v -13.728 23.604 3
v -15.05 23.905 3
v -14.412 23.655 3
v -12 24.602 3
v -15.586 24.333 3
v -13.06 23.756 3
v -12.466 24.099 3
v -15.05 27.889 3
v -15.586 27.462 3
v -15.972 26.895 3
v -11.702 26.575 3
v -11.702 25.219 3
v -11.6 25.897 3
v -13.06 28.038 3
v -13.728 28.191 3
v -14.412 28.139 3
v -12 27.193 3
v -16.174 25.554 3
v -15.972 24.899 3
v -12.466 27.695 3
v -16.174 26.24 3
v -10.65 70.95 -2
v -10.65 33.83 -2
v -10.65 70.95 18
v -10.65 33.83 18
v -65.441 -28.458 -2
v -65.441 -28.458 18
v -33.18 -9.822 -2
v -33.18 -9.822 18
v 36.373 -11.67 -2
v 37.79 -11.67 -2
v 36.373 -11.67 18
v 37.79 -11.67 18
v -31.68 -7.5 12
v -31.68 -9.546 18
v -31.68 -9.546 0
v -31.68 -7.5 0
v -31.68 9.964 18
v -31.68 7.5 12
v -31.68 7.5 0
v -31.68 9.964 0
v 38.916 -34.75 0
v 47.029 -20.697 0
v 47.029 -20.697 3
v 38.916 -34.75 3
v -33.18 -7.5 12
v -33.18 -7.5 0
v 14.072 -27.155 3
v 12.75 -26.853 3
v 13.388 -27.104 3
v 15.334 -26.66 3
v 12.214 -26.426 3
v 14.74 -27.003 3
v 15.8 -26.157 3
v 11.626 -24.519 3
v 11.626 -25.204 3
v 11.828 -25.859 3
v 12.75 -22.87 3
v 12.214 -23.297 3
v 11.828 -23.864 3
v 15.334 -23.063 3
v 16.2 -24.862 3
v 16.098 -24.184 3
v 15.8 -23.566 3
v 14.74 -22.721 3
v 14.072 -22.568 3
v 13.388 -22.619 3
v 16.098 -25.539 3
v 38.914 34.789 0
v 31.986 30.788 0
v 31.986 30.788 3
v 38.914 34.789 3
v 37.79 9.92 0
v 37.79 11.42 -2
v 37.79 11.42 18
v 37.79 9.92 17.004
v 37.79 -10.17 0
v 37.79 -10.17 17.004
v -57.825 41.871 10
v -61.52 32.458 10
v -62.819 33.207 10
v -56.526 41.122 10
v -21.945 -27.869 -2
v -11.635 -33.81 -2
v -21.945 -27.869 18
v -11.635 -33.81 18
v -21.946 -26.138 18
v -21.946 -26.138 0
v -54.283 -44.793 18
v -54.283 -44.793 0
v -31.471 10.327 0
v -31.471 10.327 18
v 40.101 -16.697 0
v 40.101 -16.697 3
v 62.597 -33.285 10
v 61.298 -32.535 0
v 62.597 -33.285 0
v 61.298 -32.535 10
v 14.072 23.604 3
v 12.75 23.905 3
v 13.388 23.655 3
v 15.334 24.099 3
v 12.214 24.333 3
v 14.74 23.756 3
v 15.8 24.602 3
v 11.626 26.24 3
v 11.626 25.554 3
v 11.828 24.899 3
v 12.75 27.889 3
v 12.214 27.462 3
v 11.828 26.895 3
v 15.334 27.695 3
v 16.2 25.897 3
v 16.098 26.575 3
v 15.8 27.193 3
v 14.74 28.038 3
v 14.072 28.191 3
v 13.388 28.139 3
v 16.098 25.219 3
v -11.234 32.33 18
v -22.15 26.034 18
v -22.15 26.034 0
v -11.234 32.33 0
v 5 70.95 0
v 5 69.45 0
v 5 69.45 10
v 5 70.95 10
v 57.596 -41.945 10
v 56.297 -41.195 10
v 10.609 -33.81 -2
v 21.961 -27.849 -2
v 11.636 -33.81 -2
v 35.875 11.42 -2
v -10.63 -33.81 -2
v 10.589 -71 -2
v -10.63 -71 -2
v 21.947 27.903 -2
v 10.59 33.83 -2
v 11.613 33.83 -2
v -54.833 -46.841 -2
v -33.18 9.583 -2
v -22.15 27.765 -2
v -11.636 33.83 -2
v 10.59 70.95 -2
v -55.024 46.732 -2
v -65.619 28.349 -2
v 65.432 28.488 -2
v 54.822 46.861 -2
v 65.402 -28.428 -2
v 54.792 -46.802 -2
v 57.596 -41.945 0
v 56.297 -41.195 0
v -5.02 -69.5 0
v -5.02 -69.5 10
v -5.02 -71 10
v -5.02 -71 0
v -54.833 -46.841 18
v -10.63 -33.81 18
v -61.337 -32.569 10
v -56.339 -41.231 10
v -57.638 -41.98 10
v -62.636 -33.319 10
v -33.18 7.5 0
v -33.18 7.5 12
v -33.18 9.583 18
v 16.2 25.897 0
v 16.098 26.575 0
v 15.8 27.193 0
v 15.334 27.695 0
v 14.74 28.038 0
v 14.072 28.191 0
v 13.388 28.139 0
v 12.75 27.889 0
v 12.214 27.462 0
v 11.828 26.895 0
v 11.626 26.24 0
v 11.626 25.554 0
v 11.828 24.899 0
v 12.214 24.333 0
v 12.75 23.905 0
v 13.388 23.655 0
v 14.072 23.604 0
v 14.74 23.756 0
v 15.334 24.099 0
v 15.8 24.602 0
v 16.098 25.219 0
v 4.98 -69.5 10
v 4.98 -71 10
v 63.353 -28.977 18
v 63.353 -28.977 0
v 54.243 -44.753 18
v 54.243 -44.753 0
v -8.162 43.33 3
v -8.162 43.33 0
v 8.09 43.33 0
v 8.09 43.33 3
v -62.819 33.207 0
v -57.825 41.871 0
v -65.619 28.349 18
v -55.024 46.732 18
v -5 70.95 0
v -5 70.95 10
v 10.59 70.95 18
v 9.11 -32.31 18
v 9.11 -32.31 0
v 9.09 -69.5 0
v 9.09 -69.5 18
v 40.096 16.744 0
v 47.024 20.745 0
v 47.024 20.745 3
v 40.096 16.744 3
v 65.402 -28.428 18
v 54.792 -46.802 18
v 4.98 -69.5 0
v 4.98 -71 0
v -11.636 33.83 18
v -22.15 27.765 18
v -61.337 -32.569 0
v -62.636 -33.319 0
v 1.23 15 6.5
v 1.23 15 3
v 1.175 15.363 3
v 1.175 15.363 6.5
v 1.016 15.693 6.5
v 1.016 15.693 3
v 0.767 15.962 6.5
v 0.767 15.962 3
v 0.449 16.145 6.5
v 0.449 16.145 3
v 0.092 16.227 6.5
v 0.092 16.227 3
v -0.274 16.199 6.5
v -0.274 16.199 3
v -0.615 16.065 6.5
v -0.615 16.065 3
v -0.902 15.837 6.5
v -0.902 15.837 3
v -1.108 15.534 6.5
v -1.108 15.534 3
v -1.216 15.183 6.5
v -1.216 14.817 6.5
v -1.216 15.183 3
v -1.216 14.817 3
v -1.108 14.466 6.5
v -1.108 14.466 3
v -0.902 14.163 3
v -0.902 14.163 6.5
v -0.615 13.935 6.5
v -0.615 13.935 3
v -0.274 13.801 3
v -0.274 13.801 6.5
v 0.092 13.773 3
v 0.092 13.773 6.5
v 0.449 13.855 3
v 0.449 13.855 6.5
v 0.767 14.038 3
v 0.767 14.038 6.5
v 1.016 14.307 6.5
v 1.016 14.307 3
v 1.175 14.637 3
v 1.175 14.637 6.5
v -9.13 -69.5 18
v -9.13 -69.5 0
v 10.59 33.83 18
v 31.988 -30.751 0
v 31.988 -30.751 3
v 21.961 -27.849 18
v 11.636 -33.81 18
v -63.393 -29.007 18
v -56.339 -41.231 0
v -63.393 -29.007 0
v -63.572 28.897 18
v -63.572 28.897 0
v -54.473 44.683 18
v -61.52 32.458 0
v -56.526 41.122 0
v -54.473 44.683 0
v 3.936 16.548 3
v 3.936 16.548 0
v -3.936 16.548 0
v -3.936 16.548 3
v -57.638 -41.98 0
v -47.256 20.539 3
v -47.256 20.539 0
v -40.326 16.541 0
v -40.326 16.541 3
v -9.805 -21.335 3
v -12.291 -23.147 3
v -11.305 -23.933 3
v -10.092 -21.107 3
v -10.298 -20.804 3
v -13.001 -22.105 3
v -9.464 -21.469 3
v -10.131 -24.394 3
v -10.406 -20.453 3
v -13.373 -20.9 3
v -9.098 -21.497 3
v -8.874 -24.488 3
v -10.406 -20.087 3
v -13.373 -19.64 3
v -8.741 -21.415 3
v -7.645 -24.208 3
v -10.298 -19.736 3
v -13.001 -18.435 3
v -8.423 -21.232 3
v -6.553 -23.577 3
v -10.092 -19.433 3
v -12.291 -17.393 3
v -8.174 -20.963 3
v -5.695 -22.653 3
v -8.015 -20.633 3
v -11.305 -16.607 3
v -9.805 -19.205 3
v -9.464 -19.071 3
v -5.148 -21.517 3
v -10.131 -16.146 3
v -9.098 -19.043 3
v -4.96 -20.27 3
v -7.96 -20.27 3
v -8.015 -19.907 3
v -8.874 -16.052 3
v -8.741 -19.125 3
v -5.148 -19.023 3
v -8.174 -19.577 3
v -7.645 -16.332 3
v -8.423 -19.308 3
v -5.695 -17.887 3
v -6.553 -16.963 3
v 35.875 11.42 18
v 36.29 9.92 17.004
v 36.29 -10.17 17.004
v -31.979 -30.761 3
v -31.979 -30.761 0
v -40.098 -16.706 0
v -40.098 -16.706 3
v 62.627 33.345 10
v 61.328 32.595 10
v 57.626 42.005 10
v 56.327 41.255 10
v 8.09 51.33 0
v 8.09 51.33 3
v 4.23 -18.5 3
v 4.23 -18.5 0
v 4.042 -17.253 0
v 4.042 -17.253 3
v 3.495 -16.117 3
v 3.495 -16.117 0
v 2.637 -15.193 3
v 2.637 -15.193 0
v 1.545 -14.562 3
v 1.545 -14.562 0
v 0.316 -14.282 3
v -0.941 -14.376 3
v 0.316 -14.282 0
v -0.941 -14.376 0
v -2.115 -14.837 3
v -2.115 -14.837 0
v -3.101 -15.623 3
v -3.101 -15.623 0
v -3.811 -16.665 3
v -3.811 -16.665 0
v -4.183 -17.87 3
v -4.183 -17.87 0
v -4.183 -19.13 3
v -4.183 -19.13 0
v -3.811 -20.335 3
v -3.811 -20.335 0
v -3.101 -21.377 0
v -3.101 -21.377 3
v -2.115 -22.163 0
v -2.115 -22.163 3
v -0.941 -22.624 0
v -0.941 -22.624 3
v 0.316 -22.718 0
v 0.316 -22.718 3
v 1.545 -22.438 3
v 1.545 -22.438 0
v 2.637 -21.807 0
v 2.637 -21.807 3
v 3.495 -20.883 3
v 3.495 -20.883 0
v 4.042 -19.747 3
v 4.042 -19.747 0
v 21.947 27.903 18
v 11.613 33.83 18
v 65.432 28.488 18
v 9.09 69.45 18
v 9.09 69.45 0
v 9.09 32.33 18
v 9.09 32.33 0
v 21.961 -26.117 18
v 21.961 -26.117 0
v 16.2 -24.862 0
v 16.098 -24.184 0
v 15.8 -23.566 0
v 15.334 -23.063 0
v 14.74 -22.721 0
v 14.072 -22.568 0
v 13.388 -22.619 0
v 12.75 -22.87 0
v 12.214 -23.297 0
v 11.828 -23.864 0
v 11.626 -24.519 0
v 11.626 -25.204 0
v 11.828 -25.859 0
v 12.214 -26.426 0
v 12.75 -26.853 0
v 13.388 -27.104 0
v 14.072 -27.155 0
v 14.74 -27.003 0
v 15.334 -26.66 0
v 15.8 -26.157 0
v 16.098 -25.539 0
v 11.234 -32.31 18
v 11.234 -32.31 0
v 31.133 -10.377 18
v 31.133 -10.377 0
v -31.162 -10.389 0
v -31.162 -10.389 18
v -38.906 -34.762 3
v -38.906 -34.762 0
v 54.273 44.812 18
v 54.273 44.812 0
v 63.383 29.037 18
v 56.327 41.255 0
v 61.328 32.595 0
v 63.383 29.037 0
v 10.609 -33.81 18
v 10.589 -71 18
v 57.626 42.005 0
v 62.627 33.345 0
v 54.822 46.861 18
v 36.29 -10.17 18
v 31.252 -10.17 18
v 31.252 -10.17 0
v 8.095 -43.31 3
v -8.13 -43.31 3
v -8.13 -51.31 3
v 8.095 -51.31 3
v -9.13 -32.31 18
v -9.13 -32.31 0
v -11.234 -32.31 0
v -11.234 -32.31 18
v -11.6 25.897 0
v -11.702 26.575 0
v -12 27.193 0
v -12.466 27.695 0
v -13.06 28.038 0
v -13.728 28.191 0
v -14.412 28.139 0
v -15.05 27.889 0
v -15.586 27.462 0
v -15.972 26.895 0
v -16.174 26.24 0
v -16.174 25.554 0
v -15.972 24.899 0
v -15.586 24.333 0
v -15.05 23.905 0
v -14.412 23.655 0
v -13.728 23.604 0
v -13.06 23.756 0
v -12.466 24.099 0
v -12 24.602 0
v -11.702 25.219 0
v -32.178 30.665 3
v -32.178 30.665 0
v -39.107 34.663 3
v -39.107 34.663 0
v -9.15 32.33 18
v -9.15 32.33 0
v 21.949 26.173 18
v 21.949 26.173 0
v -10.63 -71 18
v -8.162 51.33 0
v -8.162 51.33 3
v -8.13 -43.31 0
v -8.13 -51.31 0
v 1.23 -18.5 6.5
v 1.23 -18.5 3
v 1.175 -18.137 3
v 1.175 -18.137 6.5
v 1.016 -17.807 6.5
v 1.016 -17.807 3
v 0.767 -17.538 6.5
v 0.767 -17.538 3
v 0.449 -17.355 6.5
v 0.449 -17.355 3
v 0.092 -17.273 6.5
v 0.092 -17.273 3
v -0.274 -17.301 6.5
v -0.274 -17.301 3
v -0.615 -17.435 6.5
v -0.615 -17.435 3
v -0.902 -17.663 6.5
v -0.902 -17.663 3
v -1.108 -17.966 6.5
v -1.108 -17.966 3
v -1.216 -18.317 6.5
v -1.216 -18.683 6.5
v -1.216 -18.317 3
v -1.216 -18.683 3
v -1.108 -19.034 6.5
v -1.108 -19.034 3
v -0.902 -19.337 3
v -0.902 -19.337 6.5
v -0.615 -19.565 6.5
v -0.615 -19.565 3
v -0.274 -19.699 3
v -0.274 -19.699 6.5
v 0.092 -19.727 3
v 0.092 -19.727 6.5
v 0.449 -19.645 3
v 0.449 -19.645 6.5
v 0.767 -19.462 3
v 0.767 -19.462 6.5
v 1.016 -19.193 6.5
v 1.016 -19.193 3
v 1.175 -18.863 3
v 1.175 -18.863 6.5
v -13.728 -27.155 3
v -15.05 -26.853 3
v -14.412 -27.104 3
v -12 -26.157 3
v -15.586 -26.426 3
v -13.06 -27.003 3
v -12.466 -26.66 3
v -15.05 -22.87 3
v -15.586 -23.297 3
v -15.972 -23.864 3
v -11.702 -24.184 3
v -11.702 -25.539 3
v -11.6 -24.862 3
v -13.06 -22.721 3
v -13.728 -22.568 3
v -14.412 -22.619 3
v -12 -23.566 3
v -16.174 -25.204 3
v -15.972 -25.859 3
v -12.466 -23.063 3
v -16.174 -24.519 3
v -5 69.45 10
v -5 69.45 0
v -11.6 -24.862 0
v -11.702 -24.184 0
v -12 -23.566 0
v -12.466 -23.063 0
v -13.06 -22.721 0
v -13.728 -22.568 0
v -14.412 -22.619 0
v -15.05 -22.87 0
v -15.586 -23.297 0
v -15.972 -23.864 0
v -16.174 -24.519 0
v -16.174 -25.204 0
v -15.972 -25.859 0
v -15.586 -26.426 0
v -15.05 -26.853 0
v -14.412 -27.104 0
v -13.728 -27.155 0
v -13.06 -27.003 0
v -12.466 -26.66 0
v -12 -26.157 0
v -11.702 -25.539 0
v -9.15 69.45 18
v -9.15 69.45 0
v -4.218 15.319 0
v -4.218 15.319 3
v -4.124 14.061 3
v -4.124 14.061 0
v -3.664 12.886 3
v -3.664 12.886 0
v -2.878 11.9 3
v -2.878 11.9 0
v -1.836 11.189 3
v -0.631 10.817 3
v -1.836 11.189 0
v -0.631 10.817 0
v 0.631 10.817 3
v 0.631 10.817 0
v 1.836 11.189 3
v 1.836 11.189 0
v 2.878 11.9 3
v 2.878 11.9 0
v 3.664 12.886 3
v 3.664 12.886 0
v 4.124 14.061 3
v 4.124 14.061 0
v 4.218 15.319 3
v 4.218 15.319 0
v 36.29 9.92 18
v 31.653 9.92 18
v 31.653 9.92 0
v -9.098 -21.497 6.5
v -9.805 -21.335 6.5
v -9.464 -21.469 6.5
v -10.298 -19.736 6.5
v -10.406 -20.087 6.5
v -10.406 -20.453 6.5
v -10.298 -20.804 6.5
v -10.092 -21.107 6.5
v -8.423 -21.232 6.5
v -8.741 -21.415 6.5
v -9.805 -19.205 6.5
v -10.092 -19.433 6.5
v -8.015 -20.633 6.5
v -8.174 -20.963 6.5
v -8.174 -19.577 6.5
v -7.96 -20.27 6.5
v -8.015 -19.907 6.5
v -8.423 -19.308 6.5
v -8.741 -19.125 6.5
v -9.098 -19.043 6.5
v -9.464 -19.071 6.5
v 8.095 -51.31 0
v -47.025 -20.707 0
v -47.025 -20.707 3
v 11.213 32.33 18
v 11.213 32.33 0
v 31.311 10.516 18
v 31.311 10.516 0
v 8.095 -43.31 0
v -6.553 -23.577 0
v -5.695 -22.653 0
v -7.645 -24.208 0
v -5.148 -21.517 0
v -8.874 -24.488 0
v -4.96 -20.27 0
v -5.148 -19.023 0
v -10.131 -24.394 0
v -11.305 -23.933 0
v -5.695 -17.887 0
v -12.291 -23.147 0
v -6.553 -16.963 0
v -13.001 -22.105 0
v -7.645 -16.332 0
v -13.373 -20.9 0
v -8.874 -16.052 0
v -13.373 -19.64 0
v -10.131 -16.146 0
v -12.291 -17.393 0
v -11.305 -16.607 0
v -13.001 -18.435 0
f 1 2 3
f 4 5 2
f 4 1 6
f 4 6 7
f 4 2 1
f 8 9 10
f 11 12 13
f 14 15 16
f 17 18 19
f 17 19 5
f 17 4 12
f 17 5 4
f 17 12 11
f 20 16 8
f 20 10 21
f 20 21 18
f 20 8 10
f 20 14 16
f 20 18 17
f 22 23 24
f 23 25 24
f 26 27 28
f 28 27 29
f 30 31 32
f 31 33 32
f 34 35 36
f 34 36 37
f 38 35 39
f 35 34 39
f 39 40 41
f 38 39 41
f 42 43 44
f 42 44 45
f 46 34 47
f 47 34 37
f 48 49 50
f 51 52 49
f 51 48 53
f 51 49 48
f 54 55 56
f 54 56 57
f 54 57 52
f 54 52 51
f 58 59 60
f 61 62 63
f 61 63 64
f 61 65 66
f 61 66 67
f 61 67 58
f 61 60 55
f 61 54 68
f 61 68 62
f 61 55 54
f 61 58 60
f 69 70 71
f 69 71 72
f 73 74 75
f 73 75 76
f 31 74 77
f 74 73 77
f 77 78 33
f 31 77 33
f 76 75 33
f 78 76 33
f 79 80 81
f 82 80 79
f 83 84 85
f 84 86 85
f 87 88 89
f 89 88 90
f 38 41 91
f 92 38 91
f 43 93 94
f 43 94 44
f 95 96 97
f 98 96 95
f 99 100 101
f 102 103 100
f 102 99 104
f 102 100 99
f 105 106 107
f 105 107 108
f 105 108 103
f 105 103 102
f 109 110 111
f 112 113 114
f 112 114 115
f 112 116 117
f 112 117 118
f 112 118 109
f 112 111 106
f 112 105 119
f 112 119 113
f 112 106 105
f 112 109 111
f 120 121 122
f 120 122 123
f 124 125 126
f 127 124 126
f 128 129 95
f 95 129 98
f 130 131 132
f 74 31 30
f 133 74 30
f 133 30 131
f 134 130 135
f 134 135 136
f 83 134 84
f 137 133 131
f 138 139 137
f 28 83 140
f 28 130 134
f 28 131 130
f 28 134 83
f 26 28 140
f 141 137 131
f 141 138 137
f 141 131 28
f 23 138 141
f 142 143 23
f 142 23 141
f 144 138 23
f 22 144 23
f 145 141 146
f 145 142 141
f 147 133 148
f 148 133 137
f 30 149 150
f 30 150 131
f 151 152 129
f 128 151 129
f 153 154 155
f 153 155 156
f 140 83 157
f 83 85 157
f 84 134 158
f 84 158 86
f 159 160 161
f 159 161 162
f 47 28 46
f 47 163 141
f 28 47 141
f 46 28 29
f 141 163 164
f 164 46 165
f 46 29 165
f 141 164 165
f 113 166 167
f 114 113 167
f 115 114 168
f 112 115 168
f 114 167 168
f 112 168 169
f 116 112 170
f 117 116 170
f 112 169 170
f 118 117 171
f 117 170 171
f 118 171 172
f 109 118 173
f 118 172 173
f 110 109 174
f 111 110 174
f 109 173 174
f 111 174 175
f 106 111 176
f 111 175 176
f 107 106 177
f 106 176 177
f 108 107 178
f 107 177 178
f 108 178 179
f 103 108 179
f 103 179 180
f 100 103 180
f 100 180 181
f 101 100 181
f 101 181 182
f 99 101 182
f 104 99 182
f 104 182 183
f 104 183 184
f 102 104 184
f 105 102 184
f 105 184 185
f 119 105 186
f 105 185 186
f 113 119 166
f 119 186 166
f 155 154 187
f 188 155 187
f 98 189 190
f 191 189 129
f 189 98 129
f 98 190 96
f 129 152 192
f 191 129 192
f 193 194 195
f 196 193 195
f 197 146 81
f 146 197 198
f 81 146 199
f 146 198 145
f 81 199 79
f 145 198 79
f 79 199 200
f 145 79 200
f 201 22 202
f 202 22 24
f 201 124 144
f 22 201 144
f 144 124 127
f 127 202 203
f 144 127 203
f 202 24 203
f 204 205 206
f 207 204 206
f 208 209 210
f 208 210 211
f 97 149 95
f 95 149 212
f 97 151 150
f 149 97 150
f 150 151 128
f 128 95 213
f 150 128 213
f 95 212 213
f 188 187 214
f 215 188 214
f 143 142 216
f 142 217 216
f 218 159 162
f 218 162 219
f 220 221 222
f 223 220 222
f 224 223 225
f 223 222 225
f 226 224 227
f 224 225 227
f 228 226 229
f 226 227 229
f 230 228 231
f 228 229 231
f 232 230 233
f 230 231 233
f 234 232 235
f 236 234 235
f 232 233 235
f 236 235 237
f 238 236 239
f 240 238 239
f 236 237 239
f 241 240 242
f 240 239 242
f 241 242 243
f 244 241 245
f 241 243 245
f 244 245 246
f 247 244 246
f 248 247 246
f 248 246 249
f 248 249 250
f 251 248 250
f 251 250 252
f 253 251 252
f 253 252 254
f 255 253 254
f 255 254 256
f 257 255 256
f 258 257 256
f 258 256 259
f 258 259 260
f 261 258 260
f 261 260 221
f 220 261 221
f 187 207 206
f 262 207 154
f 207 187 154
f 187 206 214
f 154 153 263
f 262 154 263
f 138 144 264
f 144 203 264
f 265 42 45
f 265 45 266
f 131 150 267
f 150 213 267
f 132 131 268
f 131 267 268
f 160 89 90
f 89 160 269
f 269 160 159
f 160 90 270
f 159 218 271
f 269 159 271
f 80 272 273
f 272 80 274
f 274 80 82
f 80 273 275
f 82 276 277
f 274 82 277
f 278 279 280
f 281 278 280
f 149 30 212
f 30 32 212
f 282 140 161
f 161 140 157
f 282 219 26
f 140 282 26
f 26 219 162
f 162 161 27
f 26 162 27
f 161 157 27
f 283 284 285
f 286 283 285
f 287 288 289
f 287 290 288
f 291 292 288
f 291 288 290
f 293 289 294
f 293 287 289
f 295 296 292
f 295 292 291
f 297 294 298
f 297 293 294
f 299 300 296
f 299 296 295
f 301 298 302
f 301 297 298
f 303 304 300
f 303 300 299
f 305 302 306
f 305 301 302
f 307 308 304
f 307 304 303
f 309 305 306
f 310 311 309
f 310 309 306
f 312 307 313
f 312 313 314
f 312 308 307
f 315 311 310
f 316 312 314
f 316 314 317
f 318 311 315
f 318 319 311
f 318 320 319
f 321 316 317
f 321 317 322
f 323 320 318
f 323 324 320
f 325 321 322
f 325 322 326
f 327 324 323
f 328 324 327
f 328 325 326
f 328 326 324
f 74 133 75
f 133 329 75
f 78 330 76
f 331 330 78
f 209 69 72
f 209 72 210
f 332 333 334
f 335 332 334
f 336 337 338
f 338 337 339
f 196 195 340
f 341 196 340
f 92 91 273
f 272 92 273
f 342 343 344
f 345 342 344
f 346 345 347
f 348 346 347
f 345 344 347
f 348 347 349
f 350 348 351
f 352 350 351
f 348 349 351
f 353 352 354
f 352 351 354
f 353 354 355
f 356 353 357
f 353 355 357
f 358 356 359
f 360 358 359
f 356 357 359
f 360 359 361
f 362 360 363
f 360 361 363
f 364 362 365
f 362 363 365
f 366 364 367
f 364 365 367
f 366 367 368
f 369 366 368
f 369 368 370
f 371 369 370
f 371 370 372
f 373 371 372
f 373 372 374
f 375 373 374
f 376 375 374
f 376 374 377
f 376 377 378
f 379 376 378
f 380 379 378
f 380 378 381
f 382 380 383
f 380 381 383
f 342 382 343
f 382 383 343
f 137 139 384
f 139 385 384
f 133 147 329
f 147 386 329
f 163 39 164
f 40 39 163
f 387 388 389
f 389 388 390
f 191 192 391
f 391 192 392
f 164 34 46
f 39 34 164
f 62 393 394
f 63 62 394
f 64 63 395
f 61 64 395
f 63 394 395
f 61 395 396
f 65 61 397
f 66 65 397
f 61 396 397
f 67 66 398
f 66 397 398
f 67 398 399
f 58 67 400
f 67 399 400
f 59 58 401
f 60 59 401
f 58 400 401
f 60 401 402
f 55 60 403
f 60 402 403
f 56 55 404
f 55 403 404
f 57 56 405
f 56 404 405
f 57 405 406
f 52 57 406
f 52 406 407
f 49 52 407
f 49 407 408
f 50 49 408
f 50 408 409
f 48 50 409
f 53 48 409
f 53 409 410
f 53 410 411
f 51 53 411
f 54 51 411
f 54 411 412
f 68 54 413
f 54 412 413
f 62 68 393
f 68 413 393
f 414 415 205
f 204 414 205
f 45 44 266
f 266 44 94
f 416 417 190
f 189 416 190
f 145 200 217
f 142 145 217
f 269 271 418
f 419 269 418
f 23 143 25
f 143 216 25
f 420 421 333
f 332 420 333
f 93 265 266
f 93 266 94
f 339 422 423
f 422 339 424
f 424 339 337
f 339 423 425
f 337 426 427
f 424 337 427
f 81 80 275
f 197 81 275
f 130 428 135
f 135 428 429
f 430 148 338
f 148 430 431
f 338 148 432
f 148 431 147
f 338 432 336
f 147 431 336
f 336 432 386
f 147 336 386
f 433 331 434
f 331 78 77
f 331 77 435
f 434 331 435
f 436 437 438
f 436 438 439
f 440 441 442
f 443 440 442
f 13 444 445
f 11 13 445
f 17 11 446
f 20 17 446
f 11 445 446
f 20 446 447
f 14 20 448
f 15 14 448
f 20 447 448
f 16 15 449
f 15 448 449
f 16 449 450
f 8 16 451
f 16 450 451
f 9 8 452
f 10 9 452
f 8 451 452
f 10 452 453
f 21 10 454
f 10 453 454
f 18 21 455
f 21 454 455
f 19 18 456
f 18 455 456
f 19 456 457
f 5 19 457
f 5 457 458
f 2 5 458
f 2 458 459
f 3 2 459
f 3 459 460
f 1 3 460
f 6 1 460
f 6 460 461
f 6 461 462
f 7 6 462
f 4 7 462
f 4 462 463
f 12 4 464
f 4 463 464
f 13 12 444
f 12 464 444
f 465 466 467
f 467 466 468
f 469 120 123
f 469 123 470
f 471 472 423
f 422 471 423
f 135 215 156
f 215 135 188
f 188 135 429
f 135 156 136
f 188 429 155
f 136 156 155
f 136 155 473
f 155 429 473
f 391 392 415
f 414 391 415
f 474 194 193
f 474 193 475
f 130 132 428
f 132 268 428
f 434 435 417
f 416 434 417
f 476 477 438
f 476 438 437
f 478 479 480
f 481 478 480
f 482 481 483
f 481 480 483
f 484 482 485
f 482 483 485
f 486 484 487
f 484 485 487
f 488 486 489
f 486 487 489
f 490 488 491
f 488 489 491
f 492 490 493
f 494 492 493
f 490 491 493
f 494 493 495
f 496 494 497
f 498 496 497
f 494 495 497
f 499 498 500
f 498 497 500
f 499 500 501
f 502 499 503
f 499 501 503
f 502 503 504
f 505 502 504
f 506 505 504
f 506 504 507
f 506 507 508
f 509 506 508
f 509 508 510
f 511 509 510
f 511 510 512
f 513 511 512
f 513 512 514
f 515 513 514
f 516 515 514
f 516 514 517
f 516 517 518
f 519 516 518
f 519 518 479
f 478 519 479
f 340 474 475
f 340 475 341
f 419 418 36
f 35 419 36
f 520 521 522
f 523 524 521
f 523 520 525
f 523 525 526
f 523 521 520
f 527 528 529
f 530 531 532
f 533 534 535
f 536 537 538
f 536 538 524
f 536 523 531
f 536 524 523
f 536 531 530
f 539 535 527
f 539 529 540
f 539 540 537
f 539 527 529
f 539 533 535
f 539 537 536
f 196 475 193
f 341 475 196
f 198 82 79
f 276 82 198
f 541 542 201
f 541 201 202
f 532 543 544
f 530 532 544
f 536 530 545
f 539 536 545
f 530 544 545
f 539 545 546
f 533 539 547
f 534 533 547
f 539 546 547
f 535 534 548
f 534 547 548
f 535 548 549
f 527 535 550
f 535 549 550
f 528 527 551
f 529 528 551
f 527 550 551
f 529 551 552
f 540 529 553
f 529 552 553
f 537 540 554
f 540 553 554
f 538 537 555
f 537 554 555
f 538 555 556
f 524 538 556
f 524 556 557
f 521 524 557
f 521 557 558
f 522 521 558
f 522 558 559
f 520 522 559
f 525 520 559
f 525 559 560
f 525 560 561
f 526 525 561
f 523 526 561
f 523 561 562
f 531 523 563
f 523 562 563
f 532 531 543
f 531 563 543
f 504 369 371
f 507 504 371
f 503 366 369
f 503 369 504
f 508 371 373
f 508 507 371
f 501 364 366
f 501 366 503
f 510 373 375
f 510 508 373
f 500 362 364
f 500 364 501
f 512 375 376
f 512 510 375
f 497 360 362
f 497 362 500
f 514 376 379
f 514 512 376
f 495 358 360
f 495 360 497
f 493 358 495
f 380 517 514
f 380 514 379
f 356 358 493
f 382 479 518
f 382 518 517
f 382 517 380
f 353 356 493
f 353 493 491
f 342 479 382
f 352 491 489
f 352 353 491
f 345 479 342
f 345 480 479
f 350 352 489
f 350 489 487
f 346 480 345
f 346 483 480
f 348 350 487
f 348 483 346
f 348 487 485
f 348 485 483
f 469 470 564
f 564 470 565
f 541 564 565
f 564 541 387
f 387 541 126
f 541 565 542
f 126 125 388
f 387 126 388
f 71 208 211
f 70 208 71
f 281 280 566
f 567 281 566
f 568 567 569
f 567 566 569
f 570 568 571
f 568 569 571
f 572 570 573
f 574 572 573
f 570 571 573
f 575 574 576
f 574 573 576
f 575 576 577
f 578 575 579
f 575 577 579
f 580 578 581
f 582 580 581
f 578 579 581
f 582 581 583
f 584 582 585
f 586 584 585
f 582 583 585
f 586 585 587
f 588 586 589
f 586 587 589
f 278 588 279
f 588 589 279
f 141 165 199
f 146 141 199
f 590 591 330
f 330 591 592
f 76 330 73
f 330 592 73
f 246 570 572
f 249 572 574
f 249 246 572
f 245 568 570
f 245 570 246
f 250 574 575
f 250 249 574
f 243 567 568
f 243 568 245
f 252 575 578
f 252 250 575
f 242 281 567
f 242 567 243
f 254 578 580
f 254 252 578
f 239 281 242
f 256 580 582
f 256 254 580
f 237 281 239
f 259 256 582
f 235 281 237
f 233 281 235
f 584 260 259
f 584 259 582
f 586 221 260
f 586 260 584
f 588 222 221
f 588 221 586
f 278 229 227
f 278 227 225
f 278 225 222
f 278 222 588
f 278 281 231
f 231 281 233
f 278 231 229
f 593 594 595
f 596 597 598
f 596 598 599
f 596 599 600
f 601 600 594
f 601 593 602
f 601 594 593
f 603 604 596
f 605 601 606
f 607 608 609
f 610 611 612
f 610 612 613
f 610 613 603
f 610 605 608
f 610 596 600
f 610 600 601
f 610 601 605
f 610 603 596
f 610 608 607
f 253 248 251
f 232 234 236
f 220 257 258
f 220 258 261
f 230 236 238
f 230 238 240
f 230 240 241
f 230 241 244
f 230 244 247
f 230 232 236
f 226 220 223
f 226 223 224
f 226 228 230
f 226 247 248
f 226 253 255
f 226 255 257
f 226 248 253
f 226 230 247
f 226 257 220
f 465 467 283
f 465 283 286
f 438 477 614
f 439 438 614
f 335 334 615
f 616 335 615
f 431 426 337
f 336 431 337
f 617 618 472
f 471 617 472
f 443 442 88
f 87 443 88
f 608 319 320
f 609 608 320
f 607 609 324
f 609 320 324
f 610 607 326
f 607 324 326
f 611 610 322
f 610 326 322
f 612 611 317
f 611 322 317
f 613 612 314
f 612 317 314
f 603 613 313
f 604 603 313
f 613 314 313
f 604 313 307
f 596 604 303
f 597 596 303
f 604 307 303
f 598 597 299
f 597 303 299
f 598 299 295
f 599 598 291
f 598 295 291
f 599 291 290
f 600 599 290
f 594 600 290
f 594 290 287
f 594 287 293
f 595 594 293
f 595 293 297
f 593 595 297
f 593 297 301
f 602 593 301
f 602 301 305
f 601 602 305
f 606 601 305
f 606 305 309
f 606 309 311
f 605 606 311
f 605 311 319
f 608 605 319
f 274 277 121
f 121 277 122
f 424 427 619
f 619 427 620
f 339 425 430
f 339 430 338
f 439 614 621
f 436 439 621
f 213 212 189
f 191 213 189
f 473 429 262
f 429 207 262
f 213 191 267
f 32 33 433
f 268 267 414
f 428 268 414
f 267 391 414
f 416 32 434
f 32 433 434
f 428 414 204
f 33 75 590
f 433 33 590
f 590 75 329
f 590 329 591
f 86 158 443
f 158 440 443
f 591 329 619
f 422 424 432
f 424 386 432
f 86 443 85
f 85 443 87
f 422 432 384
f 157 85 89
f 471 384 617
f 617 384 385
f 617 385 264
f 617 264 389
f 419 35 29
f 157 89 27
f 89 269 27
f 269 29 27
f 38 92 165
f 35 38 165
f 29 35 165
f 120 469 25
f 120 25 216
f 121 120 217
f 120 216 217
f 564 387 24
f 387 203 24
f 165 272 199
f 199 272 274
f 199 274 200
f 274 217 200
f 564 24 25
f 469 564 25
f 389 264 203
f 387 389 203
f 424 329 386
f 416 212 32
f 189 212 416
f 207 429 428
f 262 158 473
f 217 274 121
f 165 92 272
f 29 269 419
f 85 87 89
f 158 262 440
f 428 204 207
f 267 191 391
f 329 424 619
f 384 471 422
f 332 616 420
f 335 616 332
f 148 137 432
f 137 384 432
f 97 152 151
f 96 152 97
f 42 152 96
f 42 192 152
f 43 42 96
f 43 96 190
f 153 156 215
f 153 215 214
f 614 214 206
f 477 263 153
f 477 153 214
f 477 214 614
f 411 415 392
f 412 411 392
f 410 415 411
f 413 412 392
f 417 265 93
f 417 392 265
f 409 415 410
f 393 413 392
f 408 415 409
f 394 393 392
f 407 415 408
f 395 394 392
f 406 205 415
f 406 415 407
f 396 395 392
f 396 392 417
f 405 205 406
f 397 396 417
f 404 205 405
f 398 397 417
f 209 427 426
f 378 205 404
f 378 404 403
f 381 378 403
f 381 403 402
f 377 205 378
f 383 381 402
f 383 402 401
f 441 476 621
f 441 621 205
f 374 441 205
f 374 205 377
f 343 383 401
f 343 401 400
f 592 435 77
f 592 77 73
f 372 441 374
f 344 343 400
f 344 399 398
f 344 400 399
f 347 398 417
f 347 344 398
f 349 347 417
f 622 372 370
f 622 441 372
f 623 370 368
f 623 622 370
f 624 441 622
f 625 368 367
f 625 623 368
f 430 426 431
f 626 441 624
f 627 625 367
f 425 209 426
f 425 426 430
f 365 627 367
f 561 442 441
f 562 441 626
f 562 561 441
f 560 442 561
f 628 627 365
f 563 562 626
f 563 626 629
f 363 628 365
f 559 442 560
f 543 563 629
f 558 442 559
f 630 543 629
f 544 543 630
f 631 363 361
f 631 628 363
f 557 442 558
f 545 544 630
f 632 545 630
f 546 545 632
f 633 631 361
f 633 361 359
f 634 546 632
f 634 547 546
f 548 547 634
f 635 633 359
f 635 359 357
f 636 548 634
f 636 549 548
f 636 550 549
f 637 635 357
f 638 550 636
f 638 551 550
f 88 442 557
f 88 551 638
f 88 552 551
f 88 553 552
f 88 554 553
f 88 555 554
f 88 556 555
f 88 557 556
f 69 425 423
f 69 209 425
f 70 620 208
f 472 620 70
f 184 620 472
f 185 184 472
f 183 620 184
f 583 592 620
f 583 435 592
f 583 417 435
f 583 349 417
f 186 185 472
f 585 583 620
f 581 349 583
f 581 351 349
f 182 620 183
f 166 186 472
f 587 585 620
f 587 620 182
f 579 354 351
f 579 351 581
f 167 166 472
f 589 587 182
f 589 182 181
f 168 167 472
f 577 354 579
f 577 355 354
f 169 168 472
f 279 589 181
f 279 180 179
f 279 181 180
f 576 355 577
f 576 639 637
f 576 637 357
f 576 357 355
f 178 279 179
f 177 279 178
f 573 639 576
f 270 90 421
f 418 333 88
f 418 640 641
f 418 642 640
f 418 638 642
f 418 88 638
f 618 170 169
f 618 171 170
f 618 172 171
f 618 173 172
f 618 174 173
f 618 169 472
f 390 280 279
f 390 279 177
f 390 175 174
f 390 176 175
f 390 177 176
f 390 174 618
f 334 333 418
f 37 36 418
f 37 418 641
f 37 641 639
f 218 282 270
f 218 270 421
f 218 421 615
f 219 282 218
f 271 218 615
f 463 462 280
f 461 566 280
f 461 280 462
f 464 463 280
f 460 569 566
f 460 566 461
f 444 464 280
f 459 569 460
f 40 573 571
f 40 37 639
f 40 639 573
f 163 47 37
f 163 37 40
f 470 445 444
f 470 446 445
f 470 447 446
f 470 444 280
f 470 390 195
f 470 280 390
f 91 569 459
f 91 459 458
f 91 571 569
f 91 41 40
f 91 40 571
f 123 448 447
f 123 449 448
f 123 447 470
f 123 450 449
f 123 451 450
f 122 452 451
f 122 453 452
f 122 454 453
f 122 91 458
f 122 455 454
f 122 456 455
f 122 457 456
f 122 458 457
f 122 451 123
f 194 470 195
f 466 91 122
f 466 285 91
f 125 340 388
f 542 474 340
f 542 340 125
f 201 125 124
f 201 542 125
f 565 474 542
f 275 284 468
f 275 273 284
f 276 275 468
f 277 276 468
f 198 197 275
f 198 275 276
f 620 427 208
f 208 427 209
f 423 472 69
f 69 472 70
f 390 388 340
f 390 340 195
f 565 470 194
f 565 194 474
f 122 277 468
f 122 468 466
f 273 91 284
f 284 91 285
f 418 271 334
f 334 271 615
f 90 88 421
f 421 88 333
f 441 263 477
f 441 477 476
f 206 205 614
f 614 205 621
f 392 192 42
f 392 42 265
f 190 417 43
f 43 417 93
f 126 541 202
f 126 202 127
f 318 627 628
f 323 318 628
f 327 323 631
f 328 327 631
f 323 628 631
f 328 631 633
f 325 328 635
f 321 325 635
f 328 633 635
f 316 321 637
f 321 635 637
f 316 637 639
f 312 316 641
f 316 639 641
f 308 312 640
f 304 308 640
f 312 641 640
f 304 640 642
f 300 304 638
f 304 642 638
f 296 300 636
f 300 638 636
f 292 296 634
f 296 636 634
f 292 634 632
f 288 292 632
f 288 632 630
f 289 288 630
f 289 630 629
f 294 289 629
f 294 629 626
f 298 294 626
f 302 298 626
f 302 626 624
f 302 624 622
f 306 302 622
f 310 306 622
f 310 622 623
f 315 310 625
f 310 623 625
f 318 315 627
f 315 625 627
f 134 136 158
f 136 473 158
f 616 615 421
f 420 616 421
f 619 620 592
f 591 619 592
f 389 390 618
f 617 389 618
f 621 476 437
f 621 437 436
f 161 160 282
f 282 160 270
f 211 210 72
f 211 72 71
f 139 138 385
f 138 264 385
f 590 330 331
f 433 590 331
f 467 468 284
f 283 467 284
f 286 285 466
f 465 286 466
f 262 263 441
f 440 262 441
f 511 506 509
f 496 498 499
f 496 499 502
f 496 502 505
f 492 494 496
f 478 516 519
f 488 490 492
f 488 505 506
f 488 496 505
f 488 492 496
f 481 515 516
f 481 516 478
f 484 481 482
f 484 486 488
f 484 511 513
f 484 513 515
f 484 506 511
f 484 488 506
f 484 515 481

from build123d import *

# Parameters (mm, degrees)
AUFSATZ_LINEAR_AUSTRAGEN1_DEPTH = 18
AUFSATZ_LINEAR_AUSTRAGEN2_DEPTH = 2
SCHNITT_LINEAR_AUSTRAGEN1_REACH = 127.501
SCHNITT_LINEAR_AUSTRAGEN2_REACH = 123.638
SKIZZE5_W                       = 12
SKIZZE5_H                       = 15
SKIZZE7_R                       = 1.22999984
AUFSATZ_LINEAR_AUSTRAGEN3_DEPTH = 6.5
SKIZZE8_R                       = 4.22999984
SKIZZE8_R_2                     = 2.3
AUFSATZ_LINEAR_AUSTRAGEN4_DEPTH = 3
SKIZZE9_W                       = 16.252283896
SKIZZE9_H                       = 8
SKIZZE9_W_2                     = 16.225392475
AUFSATZ_LINEAR_AUSTRAGEN7_DEPTH = 3
SCHNITT_LINEAR_AUSTRAGEN3_REACH = 158.064
SKIZZE11_W                      = 10
SKIZZE11_H                      = 10
SCHNITT_LINEAR_AUSTRAGEN4_REACH = 167.245
SKIZZE13_W                      = 10
SKIZZE13_H                      = 10
SCHNITT_LINEAR_AUSTRAGEN5_REACH = 167.158
SKIZZE14_W                      = 10
SKIZZE14_H                      = 10
SCHNITT_LINEAR_AUSTRAGEN6_REACH = 158.064
SKIZZE15_W                      = 10
SKIZZE15_H                      = 10
SCHNITT_LINEAR_AUSTRAGEN7_REACH = 167.062
SKIZZE16_W                      = 10
SKIZZE16_H                      = 10
SCHNITT_LINEAR_AUSTRAGEN8_REACH = 167.189
SKIZZE17_W                      = 10
SKIZZE17_H                      = 10


with BuildPart() as part:
    # Skizze1 → Aufsatz-Linear austragen1 (new body)
    with BuildSketch(Plane.XY):
        Polygon((-22.149859894, 27.765281808), (-11.635793215, 33.83000044), (-10.65000108, 33.83000044), (-10.65000108, 70.94999986), (10.5900012, 70.94999986), (10.5900012, 33.83000044), (11.612735063, 33.83000044), (21.946878227, 27.90320319), (54.822266278, 46.860690996), (65.431940836, 28.488460753), (35.875483821, 11.41999954), (37.79000014, 11.41999954), (37.79000014, -11.66999904), (36.372671479, -11.66999904), (65.402118422, -28.428154068), (54.791716349, -46.801638497), (21.961456264, -27.849347945), (11.636228403, -33.81000048), (10.608764603, -33.81000048), (10.588764643, -70.99999976), (-10.63000112, -70.99999976), (-10.63000112, -33.81000048), (-11.635211495, -33.81000048), (-21.94526311, -27.869445957), (-54.832668225, -46.841377939), (-65.441180026, -28.458395245), (-33.1799992, -9.82193495), (-33.1799992, 9.582671858), (-65.619428736, 28.349034811), (-55.023633975, 46.732102334), align=None)
        Polygon((-22.149950537, 26.033576659), (-11.234189479, 32.33000044), (-9.15000108, 32.33000044), (-9.15000108, 69.44999986), (9.0900012, 69.44999986), (9.0900012, 32.33000044), (11.2131258, 32.33000044), (21.948913697, 26.172853479), (54.272963006, 44.812413555), (63.382848908, 29.03729054), (31.311020441, 10.516235735), (31.653238716, 9.91999954), (36.29000014, 9.91999954), (36.29000014, -10.16999904), (31.252050971, -10.16999904), (31.132619329, -10.37701429), (63.352910716, -28.977183946), (54.242770108, -44.752743199), (21.961450411, -26.11734559), (11.234340849, -32.31000048), (9.109571053, -32.31000048), (9.089571093, -69.49999976), (-9.13000112, -69.49999976), (-9.13000112, -32.31000048), (-11.233987142, -32.31000048), (-21.945708018, -26.138007916), (-54.2831028, -44.792652518), (-63.392584266, -29.007267794), (-31.162137007, -10.388561496), (-31.6799992, -9.546253935), (-31.6799992, 9.963511331), (-31.471105622, 10.326986156), (-63.571974887, 28.897490395), (-54.473438465, 44.682904625), align=None, mode=Mode.SUBTRACT)
    extrude(amount=AUFSATZ_LINEAR_AUSTRAGEN1_DEPTH)

    # Skizze3 → Aufsatz-Linear austragen2 (add)
    with BuildSketch(Plane(origin=(0, 0, 0), x_dir=(-1, 0, 0), z_dir=(0, 0, -1))):
        Polygon((55.023633975, 46.732102334), (22.149859894, 27.765281808), (11.635793215, 33.83000044), (10.65000108, 33.83000044), (10.65000108, 70.94999986), (-10.5900012, 70.94999986), (-10.5900012, 33.83000044), (-11.612735063, 33.83000044), (-21.946878227, 27.90320319), (-54.822266278, 46.860690996), (-65.431940836, 28.488460753), (-35.875483821, 11.41999954), (-37.79000014, 11.41999954), (-37.79000014, -11.66999904), (-36.372671479, -11.66999904), (-65.402118422, -28.428154068), (-54.791716349, -46.801638497), (-21.961456264, -27.849347945), (-11.636228403, -33.81000048), (-10.608764603, -33.81000048), (-10.588764643, -70.99999976), (10.63000112, -70.99999976), (10.63000112, -33.81000048), (11.635211495, -33.81000048), (21.94526311, -27.869445957), (54.832668225, -46.841377939), (65.441180026, -28.458395245), (33.1799992, -9.82193495), (33.1799992, 9.582671858), (65.619428736, 28.349034811), align=None)
    extrude(amount=AUFSATZ_LINEAR_AUSTRAGEN2_DEPTH)

    # Skizze4 → Schnitt-Linear austragen1 (cut, up to next)
    with BuildSketch(Plane.ZY.offset(-36.29000014), mode=Mode.PRIVATE) as schnitt_linear_austragen1_sk1:
        Polygon((17.00382914, 9.91999954), (17.00382914, -10.16999904), (0.851260669, -10.16999904), (0, -10.16999904), (0, 9.91999954), (0.851260669, 9.91999954), align=None)
    schnitt_linear_austragen1_tool1 = extrude(schnitt_linear_austragen1_sk1.sketch, amount=-SCHNITT_LINEAR_AUSTRAGEN1_REACH, mode=Mode.PRIVATE) & part.part
    add(schnitt_linear_austragen1_tool1.solids().sort_by_distance((36.29, -0.125, 8.501915))[0], mode=Mode.SUBTRACT)

    # Skizze5 → Schnitt-Linear austragen2 (cut, up to next)
    with BuildSketch(Plane(origin=(-31.6799992, 0, 0), x_dir=(0, 0, -1), z_dir=(1, 0, 0)), mode=Mode.PRIVATE) as schnitt_linear_austragen2_sk1:
        with Locations((-6, 0)):
            Rectangle(SKIZZE5_W, SKIZZE5_H)
    schnitt_linear_austragen2_tool1 = extrude(schnitt_linear_austragen2_sk1.sketch, amount=-SCHNITT_LINEAR_AUSTRAGEN2_REACH, mode=Mode.PRIVATE) & part.part
    add(schnitt_linear_austragen2_tool1.solids().sort_by_distance((-31.679999, 0, 6))[0], mode=Mode.SUBTRACT)

    # Skizze7 → Aufsatz-Linear austragen3 (add)
    with BuildSketch(Plane.XY):
        with Locations((0, 15.00000048)):
            Circle(SKIZZE7_R)
        with Locations((0, -18.5000011)):
            Circle(SKIZZE7_R)
        with Locations((-9.1899994, -20.2700001)):
            Circle(SKIZZE7_R)
    extrude(amount=AUFSATZ_LINEAR_AUSTRAGEN3_DEPTH)

    # Skizze8 → Aufsatz-Linear austragen4 (add)
    with BuildSketch(Plane.XY):
        with Locations((-9.1899994, -20.2700001)):
            Circle(SKIZZE8_R)
        with Locations((0, -18.5000011)):
            Circle(SKIZZE8_R)
        with Locations((13.9, 25.897140228)):
            Circle(SKIZZE8_R_2)
        with Locations((-13.9, 25.897140228)):
            Circle(SKIZZE8_R_2)
        with Locations((13.9, -24.8615628)):
            Circle(SKIZZE8_R_2)
        with Locations((-13.9, -24.8615628)):
            Circle(SKIZZE8_R_2)
        with BuildLine():
            Line((3.936452455, 16.548303007), (-3.936452455, 16.548303007))
            ThreePointArc((-3.936452455, 16.548303007), (0, 10.77000064), (3.936452455, 16.548303007))
        make_face()
    extrude(amount=AUFSATZ_LINEAR_AUSTRAGEN4_DEPTH)

    # Skizze9 → Aufsatz-Linear austragen7 (add)
    with BuildSketch(Plane.XY):
        Polygon((-39.106966425, 34.662574989), (-47.255864546, 20.538698219), (-40.326487672, 16.540731718), (-32.177589551, 30.664608488), align=None)
        with Locations((-0.036140748, 47.33000044)):
            Rectangle(SKIZZE9_W, SKIZZE9_H)
        Polygon((40.096213315, 16.744336658), (31.986065924, 30.788205039), (38.913859811, 34.78891396), (47.024007202, 20.745045579), align=None)
        Polygon((40.10078632, -16.697308213), (47.029196881, -20.696949084), (38.916380603, -34.750441337), (31.987970041, -30.750800466), align=None)
        with Locations((-0.017304883, -47.31000048)):
            Rectangle(SKIZZE9_W_2, SKIZZE9_H)
        Polygon((-38.906027405, -34.762365837), (-31.978796823, -30.760681634), (-40.098111463, -16.705508406), (-47.025342045, -20.70719261), align=None)
    extrude(amount=AUFSATZ_LINEAR_AUSTRAGEN7_DEPTH)

    # Skizze11 → Schnitt-Linear austragen3 (cut, up to next)
    with BuildSketch(Plane.XZ.offset(-69.44999986), mode=Mode.PRIVATE) as schnitt_linear_austragen3_sk1:
        with Locations((0, 5)):
            Rectangle(SKIZZE11_W, SKIZZE11_H)
    schnitt_linear_austragen3_tool1 = extrude(schnitt_linear_austragen3_sk1.sketch, amount=-SCHNITT_LINEAR_AUSTRAGEN3_REACH, mode=Mode.PRIVATE) & part.part
    add(schnitt_linear_austragen3_tool1.solids().sort_by_distance((0, 69.45, 5))[0], mode=Mode.SUBTRACT)

    # Skizze13 → Schnitt-Linear austragen4 (cut, up to next)
    with BuildSketch(Plane(origin=(60.106593545, 34.710614216, 0), x_dir=(0, 0, 1), z_dir=(-0.8659751400407392, -0.5000870492538497, 0)), mode=Mode.PRIVATE) as schnitt_linear_austragen4_sk1:
        with Locations((5, 2.556930019)):
            Rectangle(SKIZZE13_W, SKIZZE13_H)
    schnitt_linear_austragen4_tool1 = extrude(schnitt_linear_austragen4_sk1.sketch, amount=-SCHNITT_LINEAR_AUSTRAGEN4_REACH, mode=Mode.PRIVATE) & part.part
    add(schnitt_linear_austragen4_tool1.solids().sort_by_distance((58.827906, 36.924852, 5))[0], mode=Mode.SUBTRACT)

    # Skizze14 → Schnitt-Linear austragen5 (cut, up to next)
    with BuildSketch(Plane(origin=(60.058107222, -34.682624727, 0), x_dir=(0, 0, 1), z_dir=(-0.8659750738448291, 0.5000871638819006, 0)), mode=Mode.PRIVATE) as schnitt_linear_austragen5_sk1:
        with Locations((5, -2.520094297)):
            Rectangle(SKIZZE14_W, SKIZZE14_H)
    schnitt_linear_austragen5_tool1 = extrude(schnitt_linear_austragen5_sk1.sketch, amount=-SCHNITT_LINEAR_AUSTRAGEN5_REACH, mode=Mode.PRIVATE) & part.part
    add(schnitt_linear_austragen5_tool1.solids().sort_by_distance((58.79784, -36.864964, 5))[0], mode=Mode.SUBTRACT)

    # Skizze15 → Schnitt-Linear austragen6 (cut, up to next)
    with BuildSketch(Plane(origin=(0, -69.49999976, 0), x_dir=(1, 0, 0), z_dir=(0, 1, 0)), mode=Mode.PRIVATE) as schnitt_linear_austragen6_sk1:
        with Locations((-0.020215013, -5)):
            Rectangle(SKIZZE15_W, SKIZZE15_H)
    schnitt_linear_austragen6_tool1 = extrude(schnitt_linear_austragen6_sk1.sketch, amount=-SCHNITT_LINEAR_AUSTRAGEN6_REACH, mode=Mode.PRIVATE) & part.part
    add(schnitt_linear_austragen6_tool1.solids().sort_by_distance((-0.020215, -69.5, 5))[0], mode=Mode.SUBTRACT)

    # Skizze16 → Schnitt-Linear austragen7 (cut, up to next)
    with BuildSketch(Plane(origin=(-60.113041463, -34.690230655, 0), x_dir=(0, 0, -1), z_dir=(0.8661255219511101, 0.49982655014006316, 0)), mode=Mode.PRIVATE) as schnitt_linear_austragen7_sk1:
        with Locations((-5, -2.551280899)):
            Rectangle(SKIZZE16_W, SKIZZE16_H)
    schnitt_linear_austragen7_tool1 = extrude(schnitt_linear_austragen7_sk1.sketch, amount=-SCHNITT_LINEAR_AUSTRAGEN7_REACH, mode=Mode.PRIVATE) & part.part
    add(schnitt_linear_austragen7_tool1.solids().sort_by_distance((-58.837844, -36.89996, 5))[0], mode=Mode.SUBTRACT)

    # Skizze17 → Schnitt-Linear austragen8 (cut, up to next)
    with BuildSketch(Plane(origin=(-60.221224503, 34.710841064, 0), x_dir=(0, 0, -1), z_dir=(0.8663858686371327, -0.4993751361710765, 0)), mode=Mode.PRIVATE) as schnitt_linear_austragen8_sk1:
        with Locations((-5, 2.400035044)):
            Rectangle(SKIZZE17_W, SKIZZE17_H)
    schnitt_linear_austragen8_tool1 = extrude(schnitt_linear_austragen8_sk1.sketch, amount=-SCHNITT_LINEAR_AUSTRAGEN8_REACH, mode=Mode.PRIVATE) & part.part
    add(schnitt_linear_austragen8_tool1.solids().sort_by_distance((-59.022707, 36.790198, 5))[0], mode=Mode.SUBTRACT)


solid = part.part
